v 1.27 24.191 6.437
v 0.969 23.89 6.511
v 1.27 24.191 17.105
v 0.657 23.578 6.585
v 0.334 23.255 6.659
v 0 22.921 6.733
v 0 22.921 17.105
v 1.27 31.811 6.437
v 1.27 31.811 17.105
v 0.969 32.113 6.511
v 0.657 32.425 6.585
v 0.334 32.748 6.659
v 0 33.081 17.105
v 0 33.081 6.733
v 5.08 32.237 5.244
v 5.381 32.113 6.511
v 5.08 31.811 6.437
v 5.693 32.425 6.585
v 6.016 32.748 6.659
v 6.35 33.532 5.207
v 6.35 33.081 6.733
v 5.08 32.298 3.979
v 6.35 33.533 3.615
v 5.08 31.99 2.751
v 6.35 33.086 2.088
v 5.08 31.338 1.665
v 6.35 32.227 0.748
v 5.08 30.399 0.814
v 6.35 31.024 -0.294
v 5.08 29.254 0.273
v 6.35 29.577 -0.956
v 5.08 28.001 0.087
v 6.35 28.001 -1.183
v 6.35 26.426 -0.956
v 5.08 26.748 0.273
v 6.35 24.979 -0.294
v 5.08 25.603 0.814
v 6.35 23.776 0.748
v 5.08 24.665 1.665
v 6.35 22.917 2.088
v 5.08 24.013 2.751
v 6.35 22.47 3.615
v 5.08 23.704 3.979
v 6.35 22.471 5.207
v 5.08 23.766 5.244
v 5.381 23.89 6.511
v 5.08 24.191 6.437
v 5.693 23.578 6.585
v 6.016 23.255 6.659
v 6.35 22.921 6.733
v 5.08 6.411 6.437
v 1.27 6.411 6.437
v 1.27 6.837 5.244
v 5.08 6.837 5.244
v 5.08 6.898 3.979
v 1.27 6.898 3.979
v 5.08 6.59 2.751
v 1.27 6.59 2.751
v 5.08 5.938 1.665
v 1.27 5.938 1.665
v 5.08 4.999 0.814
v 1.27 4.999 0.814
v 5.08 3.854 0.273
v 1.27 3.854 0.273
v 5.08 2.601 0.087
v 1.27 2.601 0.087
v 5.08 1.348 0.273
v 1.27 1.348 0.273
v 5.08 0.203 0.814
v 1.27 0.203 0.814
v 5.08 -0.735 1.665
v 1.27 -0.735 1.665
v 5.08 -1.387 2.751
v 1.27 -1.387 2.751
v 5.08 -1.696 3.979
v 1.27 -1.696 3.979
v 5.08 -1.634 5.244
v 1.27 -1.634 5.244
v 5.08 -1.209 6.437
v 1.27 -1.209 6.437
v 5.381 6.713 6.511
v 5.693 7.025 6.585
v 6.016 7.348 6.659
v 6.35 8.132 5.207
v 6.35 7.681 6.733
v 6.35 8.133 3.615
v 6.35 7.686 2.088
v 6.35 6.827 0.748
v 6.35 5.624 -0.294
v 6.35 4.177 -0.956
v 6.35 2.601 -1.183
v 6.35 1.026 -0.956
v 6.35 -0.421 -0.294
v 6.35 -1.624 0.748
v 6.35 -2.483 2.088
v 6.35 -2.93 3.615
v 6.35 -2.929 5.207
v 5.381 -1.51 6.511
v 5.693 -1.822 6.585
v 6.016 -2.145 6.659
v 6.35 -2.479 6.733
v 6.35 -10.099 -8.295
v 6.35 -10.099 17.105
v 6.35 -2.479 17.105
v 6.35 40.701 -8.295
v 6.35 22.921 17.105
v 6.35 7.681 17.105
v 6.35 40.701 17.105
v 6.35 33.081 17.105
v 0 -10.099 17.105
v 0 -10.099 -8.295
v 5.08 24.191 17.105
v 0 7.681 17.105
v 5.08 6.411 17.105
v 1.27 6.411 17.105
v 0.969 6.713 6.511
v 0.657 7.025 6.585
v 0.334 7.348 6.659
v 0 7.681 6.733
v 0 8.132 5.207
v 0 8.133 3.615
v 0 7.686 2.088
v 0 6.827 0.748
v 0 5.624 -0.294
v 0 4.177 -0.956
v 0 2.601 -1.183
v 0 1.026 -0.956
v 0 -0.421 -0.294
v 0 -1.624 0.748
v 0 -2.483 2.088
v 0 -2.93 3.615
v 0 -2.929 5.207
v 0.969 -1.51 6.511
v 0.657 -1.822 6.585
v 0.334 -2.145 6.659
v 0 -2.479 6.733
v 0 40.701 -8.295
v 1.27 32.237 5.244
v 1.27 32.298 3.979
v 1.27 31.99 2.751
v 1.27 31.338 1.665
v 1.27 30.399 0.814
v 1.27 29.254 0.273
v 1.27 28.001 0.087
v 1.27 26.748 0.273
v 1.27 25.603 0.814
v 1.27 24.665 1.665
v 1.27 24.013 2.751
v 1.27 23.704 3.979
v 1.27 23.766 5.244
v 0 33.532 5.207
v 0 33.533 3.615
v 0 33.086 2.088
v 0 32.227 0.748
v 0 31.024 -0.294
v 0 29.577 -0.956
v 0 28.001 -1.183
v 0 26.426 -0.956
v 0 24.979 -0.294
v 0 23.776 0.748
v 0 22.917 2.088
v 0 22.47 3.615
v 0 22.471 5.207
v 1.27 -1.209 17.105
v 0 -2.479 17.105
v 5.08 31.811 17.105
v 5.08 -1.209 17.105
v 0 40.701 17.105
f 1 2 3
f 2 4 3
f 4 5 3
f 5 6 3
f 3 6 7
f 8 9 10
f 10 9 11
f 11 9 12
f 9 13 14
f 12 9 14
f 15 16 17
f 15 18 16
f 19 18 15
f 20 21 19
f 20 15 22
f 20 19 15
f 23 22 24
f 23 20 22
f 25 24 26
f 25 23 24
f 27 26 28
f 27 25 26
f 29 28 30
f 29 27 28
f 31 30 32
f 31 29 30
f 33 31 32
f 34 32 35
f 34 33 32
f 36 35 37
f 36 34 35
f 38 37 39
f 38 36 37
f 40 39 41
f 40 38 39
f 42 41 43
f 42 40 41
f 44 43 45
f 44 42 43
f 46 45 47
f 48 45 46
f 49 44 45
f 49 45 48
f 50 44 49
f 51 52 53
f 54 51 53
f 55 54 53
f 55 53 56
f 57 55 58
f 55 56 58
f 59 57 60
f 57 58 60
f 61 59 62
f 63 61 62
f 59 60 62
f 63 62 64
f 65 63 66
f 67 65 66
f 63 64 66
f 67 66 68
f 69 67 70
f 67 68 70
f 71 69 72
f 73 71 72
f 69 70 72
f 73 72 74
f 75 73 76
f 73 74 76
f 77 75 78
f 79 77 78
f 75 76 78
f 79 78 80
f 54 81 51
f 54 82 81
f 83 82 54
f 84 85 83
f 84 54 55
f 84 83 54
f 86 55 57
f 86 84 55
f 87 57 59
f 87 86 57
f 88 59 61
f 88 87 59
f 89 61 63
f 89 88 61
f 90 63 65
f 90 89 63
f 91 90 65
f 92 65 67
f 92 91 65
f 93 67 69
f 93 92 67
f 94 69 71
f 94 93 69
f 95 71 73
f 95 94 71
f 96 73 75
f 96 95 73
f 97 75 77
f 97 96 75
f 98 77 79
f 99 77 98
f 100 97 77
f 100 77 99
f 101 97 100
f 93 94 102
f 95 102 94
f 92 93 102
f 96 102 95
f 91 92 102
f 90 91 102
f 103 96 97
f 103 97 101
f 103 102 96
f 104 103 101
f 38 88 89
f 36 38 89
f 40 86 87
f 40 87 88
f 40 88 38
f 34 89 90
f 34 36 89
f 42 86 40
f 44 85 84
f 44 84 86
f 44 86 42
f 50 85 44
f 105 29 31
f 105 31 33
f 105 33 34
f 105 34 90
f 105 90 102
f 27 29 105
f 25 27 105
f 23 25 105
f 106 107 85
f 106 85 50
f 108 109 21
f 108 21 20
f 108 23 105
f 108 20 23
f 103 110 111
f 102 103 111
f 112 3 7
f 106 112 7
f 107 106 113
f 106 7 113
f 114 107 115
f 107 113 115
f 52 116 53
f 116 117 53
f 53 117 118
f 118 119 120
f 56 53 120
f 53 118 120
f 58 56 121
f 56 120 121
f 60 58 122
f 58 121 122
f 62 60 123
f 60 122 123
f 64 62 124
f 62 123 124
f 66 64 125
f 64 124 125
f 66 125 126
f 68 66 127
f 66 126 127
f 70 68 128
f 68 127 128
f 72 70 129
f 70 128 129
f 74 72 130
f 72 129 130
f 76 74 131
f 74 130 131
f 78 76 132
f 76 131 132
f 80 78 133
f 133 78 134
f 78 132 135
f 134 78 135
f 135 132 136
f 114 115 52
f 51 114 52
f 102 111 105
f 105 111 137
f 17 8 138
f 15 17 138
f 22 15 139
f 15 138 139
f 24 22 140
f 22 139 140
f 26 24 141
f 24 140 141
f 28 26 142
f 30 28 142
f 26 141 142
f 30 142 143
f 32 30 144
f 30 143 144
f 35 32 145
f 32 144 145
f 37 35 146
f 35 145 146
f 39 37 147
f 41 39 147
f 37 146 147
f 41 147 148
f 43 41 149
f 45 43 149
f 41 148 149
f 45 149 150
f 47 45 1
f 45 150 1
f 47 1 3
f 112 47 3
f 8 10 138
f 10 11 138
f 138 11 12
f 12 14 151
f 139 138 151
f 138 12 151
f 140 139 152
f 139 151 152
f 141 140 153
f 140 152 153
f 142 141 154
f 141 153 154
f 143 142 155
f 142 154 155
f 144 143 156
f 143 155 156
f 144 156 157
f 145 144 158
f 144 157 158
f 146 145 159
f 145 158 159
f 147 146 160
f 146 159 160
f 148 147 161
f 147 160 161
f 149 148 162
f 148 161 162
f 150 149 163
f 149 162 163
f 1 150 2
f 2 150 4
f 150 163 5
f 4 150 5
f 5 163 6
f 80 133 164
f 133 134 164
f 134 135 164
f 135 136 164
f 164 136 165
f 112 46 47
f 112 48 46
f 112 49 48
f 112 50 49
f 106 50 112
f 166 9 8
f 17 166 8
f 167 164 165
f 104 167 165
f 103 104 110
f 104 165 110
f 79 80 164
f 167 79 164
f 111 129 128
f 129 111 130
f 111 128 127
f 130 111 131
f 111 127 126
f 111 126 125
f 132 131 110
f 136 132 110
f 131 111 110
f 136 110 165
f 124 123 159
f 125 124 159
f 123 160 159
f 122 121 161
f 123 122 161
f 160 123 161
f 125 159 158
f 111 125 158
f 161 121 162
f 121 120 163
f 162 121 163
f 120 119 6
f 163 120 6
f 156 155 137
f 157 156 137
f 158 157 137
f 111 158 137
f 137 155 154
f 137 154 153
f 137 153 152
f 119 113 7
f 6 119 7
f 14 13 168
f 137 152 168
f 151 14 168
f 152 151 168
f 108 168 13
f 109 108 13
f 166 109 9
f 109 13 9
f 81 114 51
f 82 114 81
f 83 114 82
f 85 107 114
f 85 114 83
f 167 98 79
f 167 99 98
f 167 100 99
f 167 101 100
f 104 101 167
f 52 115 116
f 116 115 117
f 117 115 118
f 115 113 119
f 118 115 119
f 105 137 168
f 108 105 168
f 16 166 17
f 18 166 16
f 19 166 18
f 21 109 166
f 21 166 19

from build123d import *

# Parameters (mm, degrees)
F1_DEPTH = 6.35
F2_SIZE  = 1.27


# Not quite as in the source:
# - a feature names something its author has since deleted; it is built from what else it names


with BuildPart() as f1:
    # F0 (on Right) → F1 (new body)
    with BuildSketch(Plane.YZ):
        with BuildLine():
            Line((-10.0986241174, -8.2946426358), (40.7013758826, -8.2946426358))
            Line((40.7013758826, -8.2946426358), (40.7013758826, 17.1053573642))
            Line((40.7013758826, 17.1053573642), (31.8113758826, 17.1053573642))
            Line((31.8113758826, 17.1053573642), (31.8113758826, 6.4373573642))
            ThreePointArc((31.8113758826, 6.4373573642), (28.0013758826, 0.0873573642), (24.1913758826, 6.4373573642))
            Line((24.1913758826, 6.4373573642), (24.1913758826, 17.1053573642))
            Line((24.1913758826, 17.1053573642), (15.3013758826, 17.1053573642))
            Line((15.3013758826, 17.1053573642), (6.4113758826, 17.1053573642))
            Line((6.4113758826, 17.1053573642), (6.4113758826, 6.4373573642))
            ThreePointArc((6.4113758826, 6.4373573642), (2.6013758826, 0.0873573642), (-1.2086241174, 6.4373573642))
            Line((-1.2086241174, 6.4373573642), (-1.2086241174, 17.1053573642))
            Line((-1.2086241174, 17.1053573642), (-10.0986241174, 17.1053573642))
            Line((-10.0986241174, 17.1053573642), (-10.0986241174, -8.2946426358))
        make_face()
    extrude(amount=F1_DEPTH)

    # F2
    f2_edges = [f1.edges().sort_by_distance(p)[0] for p in [
        (6.35, -1.208624, 11.771357),
        (6.35, 2.601376, 0.087357),
        (6.35, 6.411376, 11.771357),
        (6.35, 24.191376, 11.771357),
        (6.35, 28.001376, 0.087357),
        (6.35, 31.811376, 11.771357),
        (0, 2.601376, 0.087357),
        (0, -1.208624, 11.771357),
        (0, 24.191376, 11.771357),
        (0, 28.001376, 0.087357),
        (0, 31.811376, 11.771357),
        (0, 6.411376, 11.771357),
    ]]
    chamfer(f2_edges, length=F2_SIZE)


solid = f1.part
